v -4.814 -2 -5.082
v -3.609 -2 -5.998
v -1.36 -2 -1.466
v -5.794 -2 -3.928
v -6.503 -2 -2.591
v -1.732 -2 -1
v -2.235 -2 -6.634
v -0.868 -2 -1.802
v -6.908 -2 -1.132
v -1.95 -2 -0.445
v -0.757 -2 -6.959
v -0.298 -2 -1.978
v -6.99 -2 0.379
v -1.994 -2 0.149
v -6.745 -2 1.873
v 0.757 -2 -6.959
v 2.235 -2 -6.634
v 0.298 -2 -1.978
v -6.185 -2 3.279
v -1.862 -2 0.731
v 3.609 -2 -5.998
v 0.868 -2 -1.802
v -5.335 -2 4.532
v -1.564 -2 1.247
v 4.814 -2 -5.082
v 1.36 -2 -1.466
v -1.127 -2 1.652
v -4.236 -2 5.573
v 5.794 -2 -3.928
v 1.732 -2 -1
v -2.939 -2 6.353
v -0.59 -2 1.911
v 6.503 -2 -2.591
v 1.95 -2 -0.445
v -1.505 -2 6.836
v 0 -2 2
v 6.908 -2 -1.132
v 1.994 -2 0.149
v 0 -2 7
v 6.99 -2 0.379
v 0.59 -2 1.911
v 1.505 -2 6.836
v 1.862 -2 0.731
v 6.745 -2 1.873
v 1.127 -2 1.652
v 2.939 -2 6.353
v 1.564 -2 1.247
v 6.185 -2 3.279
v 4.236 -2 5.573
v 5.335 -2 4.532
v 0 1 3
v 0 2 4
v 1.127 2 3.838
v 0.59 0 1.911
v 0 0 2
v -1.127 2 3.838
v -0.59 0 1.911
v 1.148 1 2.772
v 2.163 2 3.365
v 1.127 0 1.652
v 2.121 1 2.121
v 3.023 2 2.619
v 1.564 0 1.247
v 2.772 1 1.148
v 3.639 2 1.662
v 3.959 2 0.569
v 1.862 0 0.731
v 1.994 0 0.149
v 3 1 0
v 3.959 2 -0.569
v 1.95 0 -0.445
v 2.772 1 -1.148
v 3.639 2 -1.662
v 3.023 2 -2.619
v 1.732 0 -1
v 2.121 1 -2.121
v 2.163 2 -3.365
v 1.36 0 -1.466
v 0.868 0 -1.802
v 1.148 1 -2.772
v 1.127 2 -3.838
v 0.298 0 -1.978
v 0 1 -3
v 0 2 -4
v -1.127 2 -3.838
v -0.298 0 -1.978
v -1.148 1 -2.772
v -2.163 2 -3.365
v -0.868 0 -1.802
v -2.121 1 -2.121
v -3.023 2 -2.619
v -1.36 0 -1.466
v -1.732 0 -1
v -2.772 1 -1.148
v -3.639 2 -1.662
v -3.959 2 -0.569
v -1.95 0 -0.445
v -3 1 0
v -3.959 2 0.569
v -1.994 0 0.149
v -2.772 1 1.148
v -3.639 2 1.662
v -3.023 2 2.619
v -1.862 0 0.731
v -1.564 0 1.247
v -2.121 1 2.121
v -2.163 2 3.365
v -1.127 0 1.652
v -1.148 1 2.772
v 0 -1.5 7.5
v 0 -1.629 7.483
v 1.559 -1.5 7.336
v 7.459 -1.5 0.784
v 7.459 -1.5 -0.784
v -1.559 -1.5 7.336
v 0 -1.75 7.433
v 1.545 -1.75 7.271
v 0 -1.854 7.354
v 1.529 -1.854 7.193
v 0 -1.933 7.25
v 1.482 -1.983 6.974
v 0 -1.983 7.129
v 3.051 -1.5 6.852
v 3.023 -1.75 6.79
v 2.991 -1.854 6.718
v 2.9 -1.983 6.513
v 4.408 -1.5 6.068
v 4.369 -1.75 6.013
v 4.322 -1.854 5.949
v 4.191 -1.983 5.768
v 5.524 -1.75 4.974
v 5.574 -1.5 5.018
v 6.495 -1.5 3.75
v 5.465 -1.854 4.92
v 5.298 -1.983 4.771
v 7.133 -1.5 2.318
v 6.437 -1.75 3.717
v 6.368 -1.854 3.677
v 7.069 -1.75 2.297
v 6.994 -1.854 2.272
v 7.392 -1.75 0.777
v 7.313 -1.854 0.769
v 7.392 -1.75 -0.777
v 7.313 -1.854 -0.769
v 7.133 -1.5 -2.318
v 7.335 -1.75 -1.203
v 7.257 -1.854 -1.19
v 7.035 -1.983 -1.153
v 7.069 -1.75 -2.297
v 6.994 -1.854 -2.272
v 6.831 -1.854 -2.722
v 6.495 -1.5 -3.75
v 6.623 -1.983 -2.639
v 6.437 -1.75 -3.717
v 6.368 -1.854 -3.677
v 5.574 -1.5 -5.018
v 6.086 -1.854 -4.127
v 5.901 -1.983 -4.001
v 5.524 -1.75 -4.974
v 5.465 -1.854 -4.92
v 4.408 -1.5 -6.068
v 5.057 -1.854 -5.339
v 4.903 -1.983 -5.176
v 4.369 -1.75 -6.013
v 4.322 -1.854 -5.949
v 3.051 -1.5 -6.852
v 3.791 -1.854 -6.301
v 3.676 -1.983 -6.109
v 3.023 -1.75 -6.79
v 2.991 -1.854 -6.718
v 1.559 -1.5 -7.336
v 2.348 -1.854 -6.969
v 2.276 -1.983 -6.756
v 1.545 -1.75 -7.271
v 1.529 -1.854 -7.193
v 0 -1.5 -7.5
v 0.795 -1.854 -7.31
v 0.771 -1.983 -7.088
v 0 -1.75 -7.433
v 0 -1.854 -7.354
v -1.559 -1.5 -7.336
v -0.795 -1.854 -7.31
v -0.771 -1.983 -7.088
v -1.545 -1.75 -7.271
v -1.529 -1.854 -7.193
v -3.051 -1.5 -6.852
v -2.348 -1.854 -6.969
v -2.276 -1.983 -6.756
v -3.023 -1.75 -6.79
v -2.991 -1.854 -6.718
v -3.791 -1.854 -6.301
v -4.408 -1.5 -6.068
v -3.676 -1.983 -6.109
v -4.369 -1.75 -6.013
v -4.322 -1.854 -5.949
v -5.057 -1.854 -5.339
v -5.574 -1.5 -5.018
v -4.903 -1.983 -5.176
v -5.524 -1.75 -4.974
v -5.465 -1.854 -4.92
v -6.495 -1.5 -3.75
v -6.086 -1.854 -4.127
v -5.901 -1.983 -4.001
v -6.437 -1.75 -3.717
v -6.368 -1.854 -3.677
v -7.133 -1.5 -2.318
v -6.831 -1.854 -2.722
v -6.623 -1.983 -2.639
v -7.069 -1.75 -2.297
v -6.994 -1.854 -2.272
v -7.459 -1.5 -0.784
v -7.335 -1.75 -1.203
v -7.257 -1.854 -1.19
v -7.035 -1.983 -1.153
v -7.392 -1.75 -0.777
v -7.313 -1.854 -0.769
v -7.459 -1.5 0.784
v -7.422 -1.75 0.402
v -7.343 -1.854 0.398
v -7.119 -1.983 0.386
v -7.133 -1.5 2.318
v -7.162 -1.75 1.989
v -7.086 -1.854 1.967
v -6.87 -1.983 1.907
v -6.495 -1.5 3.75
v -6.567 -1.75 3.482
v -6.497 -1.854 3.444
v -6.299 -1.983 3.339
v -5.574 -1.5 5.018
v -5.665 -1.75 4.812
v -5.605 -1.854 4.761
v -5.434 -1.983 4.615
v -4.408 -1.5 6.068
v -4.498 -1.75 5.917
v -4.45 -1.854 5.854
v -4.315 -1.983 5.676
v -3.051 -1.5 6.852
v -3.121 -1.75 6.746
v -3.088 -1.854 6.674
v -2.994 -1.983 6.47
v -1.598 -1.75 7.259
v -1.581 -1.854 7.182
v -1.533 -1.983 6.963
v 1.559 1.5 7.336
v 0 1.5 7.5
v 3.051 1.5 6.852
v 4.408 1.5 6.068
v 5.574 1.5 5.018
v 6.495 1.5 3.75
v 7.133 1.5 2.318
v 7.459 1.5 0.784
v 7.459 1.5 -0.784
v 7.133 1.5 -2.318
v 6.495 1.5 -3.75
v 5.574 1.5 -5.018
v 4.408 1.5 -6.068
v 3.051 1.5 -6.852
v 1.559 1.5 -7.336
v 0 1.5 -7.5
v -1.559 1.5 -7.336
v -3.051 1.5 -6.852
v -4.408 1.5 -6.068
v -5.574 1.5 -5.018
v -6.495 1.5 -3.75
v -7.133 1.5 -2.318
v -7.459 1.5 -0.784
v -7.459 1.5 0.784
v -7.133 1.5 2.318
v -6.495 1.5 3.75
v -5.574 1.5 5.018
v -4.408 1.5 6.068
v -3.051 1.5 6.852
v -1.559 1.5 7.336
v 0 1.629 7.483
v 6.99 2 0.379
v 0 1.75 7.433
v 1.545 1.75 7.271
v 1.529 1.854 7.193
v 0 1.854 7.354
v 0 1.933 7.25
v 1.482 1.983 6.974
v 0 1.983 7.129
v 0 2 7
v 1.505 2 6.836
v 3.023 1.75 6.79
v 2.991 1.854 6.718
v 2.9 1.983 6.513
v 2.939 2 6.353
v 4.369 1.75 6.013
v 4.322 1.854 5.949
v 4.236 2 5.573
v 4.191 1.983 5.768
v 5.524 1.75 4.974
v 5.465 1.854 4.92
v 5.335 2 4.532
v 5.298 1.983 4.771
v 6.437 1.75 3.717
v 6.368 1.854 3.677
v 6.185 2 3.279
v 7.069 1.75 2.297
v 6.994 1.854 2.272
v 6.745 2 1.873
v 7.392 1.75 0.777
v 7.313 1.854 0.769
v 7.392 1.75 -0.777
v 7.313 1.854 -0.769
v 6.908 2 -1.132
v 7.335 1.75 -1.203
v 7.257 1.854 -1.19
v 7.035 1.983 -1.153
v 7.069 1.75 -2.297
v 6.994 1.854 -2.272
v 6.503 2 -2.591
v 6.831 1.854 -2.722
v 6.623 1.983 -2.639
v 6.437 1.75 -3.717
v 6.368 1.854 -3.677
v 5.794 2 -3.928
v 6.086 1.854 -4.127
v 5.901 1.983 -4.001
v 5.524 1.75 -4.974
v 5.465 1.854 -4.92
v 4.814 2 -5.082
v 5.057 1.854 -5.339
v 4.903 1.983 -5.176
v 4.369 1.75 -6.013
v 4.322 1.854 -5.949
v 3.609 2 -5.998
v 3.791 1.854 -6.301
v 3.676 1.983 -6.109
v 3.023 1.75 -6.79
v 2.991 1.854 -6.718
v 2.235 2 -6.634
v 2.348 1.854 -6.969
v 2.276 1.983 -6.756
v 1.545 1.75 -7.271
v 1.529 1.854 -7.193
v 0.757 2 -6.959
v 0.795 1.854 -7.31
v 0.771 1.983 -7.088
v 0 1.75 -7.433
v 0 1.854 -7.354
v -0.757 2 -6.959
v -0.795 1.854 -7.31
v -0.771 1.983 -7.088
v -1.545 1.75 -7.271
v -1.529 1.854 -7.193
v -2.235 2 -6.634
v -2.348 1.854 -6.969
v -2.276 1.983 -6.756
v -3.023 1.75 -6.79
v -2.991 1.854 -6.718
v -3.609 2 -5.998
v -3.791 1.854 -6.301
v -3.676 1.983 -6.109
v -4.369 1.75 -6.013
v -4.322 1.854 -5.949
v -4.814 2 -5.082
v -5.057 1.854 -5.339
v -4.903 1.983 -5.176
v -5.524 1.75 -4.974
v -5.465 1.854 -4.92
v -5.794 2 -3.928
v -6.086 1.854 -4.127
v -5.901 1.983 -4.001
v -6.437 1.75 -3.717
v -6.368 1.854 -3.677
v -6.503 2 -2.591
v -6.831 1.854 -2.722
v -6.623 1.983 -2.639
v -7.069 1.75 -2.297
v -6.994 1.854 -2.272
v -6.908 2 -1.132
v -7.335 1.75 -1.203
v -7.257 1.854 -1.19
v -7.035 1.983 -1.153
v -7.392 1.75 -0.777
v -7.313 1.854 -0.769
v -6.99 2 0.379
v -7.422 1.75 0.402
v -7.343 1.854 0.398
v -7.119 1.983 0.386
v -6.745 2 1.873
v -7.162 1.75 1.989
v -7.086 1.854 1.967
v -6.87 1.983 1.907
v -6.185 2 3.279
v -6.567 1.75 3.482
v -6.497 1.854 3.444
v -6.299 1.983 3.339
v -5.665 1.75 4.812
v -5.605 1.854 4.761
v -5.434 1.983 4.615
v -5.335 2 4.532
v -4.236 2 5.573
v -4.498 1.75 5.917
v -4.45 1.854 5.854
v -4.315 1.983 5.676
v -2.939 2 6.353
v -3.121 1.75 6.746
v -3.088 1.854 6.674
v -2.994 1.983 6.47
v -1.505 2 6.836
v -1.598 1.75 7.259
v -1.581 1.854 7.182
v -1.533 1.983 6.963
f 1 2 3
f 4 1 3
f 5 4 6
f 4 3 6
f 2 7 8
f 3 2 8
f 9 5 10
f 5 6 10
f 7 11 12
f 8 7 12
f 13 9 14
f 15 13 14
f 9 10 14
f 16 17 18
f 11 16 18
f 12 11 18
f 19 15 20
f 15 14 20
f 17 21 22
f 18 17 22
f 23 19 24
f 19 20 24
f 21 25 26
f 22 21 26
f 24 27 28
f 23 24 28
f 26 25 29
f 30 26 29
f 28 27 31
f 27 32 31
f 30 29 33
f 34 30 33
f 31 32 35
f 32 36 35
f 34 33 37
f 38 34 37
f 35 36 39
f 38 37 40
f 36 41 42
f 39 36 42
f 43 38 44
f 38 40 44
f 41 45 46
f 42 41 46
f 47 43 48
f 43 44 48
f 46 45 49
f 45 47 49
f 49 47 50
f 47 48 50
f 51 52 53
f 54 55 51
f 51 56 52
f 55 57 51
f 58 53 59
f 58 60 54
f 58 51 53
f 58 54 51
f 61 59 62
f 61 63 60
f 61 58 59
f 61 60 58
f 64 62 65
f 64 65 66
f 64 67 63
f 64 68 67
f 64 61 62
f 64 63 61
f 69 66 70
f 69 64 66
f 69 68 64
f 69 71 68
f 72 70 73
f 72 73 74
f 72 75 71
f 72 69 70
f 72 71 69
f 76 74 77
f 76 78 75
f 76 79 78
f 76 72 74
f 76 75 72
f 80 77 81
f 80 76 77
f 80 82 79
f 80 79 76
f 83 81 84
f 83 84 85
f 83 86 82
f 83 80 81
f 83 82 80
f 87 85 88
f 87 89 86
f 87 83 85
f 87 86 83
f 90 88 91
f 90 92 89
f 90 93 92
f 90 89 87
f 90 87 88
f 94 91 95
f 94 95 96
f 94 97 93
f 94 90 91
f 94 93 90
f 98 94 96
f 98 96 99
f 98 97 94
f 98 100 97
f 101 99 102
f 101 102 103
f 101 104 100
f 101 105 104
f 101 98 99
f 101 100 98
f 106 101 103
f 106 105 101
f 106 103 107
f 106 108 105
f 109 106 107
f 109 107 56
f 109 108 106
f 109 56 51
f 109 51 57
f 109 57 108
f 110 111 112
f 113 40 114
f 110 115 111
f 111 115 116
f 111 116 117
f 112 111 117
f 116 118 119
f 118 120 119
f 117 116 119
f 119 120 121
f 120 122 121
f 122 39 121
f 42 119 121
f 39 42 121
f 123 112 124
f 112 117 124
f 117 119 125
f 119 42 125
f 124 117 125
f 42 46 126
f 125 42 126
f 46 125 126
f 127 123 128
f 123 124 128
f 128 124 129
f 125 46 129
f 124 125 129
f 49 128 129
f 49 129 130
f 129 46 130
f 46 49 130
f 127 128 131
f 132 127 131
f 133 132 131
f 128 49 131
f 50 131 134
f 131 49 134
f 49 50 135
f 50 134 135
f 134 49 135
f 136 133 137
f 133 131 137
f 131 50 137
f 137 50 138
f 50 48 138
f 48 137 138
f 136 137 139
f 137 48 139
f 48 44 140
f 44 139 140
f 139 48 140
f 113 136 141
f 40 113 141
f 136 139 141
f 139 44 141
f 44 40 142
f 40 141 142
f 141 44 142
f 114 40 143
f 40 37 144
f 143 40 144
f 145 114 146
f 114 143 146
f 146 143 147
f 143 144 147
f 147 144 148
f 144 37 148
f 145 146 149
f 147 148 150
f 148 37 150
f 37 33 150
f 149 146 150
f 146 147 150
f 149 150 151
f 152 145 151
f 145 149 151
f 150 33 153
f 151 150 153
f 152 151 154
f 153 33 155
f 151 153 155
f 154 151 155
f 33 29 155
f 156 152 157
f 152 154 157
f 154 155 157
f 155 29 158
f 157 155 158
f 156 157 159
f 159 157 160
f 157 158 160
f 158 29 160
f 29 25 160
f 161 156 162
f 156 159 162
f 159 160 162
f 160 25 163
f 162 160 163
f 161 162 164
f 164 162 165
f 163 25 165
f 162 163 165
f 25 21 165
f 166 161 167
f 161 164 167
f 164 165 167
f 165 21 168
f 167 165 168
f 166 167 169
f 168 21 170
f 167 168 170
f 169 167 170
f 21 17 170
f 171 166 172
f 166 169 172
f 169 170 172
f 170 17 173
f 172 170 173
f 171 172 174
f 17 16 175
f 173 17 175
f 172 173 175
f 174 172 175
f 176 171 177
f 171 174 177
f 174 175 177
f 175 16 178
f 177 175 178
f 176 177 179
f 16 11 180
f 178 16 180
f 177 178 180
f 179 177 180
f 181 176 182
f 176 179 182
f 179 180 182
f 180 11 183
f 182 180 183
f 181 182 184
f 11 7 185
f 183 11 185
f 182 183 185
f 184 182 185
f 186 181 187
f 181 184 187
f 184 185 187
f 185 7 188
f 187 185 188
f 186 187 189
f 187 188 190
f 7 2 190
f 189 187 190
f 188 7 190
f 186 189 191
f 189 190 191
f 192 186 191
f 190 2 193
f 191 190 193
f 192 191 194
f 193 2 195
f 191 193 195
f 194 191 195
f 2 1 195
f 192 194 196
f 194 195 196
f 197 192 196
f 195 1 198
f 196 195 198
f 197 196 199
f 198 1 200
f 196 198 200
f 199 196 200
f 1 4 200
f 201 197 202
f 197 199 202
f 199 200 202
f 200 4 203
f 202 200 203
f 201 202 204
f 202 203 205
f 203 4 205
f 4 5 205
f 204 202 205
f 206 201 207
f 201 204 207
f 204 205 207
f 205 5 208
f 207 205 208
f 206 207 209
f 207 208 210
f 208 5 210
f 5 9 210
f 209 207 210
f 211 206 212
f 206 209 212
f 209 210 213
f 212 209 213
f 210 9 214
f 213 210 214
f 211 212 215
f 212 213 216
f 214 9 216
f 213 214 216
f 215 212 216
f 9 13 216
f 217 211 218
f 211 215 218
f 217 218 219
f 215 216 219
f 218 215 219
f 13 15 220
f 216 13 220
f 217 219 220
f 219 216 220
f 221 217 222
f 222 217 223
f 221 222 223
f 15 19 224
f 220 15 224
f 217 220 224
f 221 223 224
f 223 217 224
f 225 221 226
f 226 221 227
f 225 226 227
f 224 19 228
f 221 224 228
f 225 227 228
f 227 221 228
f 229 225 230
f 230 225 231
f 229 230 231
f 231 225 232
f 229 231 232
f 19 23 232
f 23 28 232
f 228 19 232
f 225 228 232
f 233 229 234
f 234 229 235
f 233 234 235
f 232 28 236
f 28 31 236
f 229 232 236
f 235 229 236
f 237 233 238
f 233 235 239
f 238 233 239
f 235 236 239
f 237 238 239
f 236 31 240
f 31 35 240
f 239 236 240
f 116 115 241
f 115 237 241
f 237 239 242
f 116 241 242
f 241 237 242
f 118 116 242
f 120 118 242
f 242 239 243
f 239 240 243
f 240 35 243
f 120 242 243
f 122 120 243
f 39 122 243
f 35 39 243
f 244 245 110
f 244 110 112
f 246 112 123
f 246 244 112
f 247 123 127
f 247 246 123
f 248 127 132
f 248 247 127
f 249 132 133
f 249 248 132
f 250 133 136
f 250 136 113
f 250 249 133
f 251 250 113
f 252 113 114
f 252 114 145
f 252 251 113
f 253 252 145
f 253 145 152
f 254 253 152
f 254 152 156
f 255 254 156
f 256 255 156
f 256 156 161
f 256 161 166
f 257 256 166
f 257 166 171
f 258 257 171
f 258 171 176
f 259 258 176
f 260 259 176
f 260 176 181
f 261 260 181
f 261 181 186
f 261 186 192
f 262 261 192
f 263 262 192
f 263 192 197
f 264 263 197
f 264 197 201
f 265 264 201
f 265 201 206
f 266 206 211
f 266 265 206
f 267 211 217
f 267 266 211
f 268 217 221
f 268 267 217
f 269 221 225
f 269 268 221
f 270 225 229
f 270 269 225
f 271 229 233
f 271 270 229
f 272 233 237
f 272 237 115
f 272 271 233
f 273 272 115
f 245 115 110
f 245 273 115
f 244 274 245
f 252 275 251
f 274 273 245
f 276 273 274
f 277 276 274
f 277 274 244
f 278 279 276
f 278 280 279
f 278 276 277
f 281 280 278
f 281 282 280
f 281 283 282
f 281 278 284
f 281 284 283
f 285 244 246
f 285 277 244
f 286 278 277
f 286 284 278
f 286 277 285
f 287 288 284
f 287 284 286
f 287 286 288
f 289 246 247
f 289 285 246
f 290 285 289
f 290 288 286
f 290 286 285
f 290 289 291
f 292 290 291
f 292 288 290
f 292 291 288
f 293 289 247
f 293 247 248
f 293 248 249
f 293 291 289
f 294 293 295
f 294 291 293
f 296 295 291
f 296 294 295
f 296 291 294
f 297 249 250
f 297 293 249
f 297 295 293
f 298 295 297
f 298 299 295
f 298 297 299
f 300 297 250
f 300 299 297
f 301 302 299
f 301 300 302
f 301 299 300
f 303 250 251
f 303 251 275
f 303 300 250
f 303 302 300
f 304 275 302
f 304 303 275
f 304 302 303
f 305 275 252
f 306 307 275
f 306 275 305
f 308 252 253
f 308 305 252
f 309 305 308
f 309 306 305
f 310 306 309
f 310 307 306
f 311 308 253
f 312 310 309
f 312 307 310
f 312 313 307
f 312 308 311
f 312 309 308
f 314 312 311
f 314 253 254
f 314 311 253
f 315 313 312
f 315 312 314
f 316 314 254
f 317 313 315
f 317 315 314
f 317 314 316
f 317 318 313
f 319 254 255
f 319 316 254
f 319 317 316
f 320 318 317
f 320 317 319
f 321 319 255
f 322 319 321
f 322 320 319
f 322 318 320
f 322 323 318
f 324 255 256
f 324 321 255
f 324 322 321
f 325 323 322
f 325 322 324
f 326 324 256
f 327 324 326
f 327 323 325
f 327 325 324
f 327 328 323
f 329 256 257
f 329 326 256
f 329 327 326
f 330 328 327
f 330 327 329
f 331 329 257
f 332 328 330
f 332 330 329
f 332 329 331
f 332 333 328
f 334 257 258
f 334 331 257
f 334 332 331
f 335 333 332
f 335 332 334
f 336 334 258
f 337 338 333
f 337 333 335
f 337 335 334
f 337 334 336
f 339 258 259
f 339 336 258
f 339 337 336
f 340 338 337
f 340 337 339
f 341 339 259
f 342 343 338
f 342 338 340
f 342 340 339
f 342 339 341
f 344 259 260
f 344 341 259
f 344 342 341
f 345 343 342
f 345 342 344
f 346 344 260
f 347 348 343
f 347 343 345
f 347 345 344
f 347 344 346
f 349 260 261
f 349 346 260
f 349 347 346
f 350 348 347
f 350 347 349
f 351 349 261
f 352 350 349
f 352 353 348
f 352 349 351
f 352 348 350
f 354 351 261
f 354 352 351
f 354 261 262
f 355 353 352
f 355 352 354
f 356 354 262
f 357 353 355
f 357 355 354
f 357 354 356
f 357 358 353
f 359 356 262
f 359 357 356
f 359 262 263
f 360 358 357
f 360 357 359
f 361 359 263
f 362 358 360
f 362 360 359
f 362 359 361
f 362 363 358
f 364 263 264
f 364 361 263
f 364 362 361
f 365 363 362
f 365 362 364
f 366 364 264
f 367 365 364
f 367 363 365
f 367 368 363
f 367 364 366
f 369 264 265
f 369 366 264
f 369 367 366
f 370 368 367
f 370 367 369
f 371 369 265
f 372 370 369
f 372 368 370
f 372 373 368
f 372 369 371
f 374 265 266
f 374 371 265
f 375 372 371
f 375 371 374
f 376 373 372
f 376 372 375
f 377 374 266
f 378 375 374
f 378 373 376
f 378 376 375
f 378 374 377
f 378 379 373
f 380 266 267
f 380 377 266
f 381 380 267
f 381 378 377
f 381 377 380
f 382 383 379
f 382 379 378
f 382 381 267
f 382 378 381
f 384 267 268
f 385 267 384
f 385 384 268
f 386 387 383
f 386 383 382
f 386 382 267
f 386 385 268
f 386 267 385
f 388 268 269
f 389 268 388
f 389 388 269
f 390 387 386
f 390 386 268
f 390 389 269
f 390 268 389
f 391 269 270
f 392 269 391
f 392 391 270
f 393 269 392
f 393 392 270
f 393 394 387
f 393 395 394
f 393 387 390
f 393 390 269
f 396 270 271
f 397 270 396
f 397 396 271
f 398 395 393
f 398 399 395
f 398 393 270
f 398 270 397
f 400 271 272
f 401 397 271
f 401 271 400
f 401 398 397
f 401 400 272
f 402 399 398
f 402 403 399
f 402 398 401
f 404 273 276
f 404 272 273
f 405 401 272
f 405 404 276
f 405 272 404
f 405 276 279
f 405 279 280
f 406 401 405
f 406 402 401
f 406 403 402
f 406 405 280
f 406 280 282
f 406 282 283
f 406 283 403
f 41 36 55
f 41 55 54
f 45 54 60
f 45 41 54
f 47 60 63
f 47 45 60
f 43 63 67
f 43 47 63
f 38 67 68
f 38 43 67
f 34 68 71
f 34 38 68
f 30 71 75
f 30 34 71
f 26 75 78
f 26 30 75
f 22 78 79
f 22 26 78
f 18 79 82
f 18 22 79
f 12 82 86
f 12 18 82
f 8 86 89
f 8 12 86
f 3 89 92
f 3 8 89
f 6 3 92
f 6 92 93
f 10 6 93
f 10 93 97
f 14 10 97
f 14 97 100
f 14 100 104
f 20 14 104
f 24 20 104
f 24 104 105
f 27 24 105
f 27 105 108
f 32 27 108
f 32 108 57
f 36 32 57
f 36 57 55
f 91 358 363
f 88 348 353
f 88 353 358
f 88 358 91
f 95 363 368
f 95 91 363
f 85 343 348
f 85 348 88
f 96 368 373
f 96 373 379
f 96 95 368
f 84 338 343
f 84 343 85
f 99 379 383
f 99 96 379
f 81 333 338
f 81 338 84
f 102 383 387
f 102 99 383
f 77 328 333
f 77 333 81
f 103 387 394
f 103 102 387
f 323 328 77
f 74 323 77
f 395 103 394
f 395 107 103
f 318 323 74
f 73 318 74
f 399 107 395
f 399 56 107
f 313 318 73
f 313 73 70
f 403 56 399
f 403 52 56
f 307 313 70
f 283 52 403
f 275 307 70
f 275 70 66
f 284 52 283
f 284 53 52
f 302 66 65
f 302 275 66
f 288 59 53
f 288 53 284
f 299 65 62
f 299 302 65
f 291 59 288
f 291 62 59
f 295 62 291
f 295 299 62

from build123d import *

# Parameters (mm, degrees)
SKETCH1_R           = 7.5
SKETCH1_R_2         = 2
BOSS_EXTRUDE1_DEPTH = 2
FILLET1_R           = 0.5
CHAMFER1_SIZE       = 2


with BuildPart() as part:
    # Sketch1 → Boss-Extrude1 (new, symmetric)
    with BuildSketch(Plane(origin=(0, 0, 0), x_dir=(1, 0, 0), z_dir=(0, 1, 0))):
        with Locations(Location((0, 0, 0), (0, 0, 270))):
            Circle(SKETCH1_R)
        with Locations(Location((0, 0, 0), (0, 0, 270))):
            Circle(SKETCH1_R_2, mode=Mode.SUBTRACT)
    extrude(amount=BOSS_EXTRUDE1_DEPTH, both=True)

    # Fillet1
    fillet1_edges = [part.edges().sort_by_distance(p)[0] for p in [
        (0, -2, -7.5),
        (0, 2, -7.5),
    ]]
    fillet(fillet1_edges, radius=FILLET1_R)

    # Chamfer1
    chamfer1_edges = [part.edges().sort_by_distance(p)[0] for p in [
        (0, 2, -2),
    ]]
    chamfer(chamfer1_edges, length=CHAMFER1_SIZE)


solid = part.part
